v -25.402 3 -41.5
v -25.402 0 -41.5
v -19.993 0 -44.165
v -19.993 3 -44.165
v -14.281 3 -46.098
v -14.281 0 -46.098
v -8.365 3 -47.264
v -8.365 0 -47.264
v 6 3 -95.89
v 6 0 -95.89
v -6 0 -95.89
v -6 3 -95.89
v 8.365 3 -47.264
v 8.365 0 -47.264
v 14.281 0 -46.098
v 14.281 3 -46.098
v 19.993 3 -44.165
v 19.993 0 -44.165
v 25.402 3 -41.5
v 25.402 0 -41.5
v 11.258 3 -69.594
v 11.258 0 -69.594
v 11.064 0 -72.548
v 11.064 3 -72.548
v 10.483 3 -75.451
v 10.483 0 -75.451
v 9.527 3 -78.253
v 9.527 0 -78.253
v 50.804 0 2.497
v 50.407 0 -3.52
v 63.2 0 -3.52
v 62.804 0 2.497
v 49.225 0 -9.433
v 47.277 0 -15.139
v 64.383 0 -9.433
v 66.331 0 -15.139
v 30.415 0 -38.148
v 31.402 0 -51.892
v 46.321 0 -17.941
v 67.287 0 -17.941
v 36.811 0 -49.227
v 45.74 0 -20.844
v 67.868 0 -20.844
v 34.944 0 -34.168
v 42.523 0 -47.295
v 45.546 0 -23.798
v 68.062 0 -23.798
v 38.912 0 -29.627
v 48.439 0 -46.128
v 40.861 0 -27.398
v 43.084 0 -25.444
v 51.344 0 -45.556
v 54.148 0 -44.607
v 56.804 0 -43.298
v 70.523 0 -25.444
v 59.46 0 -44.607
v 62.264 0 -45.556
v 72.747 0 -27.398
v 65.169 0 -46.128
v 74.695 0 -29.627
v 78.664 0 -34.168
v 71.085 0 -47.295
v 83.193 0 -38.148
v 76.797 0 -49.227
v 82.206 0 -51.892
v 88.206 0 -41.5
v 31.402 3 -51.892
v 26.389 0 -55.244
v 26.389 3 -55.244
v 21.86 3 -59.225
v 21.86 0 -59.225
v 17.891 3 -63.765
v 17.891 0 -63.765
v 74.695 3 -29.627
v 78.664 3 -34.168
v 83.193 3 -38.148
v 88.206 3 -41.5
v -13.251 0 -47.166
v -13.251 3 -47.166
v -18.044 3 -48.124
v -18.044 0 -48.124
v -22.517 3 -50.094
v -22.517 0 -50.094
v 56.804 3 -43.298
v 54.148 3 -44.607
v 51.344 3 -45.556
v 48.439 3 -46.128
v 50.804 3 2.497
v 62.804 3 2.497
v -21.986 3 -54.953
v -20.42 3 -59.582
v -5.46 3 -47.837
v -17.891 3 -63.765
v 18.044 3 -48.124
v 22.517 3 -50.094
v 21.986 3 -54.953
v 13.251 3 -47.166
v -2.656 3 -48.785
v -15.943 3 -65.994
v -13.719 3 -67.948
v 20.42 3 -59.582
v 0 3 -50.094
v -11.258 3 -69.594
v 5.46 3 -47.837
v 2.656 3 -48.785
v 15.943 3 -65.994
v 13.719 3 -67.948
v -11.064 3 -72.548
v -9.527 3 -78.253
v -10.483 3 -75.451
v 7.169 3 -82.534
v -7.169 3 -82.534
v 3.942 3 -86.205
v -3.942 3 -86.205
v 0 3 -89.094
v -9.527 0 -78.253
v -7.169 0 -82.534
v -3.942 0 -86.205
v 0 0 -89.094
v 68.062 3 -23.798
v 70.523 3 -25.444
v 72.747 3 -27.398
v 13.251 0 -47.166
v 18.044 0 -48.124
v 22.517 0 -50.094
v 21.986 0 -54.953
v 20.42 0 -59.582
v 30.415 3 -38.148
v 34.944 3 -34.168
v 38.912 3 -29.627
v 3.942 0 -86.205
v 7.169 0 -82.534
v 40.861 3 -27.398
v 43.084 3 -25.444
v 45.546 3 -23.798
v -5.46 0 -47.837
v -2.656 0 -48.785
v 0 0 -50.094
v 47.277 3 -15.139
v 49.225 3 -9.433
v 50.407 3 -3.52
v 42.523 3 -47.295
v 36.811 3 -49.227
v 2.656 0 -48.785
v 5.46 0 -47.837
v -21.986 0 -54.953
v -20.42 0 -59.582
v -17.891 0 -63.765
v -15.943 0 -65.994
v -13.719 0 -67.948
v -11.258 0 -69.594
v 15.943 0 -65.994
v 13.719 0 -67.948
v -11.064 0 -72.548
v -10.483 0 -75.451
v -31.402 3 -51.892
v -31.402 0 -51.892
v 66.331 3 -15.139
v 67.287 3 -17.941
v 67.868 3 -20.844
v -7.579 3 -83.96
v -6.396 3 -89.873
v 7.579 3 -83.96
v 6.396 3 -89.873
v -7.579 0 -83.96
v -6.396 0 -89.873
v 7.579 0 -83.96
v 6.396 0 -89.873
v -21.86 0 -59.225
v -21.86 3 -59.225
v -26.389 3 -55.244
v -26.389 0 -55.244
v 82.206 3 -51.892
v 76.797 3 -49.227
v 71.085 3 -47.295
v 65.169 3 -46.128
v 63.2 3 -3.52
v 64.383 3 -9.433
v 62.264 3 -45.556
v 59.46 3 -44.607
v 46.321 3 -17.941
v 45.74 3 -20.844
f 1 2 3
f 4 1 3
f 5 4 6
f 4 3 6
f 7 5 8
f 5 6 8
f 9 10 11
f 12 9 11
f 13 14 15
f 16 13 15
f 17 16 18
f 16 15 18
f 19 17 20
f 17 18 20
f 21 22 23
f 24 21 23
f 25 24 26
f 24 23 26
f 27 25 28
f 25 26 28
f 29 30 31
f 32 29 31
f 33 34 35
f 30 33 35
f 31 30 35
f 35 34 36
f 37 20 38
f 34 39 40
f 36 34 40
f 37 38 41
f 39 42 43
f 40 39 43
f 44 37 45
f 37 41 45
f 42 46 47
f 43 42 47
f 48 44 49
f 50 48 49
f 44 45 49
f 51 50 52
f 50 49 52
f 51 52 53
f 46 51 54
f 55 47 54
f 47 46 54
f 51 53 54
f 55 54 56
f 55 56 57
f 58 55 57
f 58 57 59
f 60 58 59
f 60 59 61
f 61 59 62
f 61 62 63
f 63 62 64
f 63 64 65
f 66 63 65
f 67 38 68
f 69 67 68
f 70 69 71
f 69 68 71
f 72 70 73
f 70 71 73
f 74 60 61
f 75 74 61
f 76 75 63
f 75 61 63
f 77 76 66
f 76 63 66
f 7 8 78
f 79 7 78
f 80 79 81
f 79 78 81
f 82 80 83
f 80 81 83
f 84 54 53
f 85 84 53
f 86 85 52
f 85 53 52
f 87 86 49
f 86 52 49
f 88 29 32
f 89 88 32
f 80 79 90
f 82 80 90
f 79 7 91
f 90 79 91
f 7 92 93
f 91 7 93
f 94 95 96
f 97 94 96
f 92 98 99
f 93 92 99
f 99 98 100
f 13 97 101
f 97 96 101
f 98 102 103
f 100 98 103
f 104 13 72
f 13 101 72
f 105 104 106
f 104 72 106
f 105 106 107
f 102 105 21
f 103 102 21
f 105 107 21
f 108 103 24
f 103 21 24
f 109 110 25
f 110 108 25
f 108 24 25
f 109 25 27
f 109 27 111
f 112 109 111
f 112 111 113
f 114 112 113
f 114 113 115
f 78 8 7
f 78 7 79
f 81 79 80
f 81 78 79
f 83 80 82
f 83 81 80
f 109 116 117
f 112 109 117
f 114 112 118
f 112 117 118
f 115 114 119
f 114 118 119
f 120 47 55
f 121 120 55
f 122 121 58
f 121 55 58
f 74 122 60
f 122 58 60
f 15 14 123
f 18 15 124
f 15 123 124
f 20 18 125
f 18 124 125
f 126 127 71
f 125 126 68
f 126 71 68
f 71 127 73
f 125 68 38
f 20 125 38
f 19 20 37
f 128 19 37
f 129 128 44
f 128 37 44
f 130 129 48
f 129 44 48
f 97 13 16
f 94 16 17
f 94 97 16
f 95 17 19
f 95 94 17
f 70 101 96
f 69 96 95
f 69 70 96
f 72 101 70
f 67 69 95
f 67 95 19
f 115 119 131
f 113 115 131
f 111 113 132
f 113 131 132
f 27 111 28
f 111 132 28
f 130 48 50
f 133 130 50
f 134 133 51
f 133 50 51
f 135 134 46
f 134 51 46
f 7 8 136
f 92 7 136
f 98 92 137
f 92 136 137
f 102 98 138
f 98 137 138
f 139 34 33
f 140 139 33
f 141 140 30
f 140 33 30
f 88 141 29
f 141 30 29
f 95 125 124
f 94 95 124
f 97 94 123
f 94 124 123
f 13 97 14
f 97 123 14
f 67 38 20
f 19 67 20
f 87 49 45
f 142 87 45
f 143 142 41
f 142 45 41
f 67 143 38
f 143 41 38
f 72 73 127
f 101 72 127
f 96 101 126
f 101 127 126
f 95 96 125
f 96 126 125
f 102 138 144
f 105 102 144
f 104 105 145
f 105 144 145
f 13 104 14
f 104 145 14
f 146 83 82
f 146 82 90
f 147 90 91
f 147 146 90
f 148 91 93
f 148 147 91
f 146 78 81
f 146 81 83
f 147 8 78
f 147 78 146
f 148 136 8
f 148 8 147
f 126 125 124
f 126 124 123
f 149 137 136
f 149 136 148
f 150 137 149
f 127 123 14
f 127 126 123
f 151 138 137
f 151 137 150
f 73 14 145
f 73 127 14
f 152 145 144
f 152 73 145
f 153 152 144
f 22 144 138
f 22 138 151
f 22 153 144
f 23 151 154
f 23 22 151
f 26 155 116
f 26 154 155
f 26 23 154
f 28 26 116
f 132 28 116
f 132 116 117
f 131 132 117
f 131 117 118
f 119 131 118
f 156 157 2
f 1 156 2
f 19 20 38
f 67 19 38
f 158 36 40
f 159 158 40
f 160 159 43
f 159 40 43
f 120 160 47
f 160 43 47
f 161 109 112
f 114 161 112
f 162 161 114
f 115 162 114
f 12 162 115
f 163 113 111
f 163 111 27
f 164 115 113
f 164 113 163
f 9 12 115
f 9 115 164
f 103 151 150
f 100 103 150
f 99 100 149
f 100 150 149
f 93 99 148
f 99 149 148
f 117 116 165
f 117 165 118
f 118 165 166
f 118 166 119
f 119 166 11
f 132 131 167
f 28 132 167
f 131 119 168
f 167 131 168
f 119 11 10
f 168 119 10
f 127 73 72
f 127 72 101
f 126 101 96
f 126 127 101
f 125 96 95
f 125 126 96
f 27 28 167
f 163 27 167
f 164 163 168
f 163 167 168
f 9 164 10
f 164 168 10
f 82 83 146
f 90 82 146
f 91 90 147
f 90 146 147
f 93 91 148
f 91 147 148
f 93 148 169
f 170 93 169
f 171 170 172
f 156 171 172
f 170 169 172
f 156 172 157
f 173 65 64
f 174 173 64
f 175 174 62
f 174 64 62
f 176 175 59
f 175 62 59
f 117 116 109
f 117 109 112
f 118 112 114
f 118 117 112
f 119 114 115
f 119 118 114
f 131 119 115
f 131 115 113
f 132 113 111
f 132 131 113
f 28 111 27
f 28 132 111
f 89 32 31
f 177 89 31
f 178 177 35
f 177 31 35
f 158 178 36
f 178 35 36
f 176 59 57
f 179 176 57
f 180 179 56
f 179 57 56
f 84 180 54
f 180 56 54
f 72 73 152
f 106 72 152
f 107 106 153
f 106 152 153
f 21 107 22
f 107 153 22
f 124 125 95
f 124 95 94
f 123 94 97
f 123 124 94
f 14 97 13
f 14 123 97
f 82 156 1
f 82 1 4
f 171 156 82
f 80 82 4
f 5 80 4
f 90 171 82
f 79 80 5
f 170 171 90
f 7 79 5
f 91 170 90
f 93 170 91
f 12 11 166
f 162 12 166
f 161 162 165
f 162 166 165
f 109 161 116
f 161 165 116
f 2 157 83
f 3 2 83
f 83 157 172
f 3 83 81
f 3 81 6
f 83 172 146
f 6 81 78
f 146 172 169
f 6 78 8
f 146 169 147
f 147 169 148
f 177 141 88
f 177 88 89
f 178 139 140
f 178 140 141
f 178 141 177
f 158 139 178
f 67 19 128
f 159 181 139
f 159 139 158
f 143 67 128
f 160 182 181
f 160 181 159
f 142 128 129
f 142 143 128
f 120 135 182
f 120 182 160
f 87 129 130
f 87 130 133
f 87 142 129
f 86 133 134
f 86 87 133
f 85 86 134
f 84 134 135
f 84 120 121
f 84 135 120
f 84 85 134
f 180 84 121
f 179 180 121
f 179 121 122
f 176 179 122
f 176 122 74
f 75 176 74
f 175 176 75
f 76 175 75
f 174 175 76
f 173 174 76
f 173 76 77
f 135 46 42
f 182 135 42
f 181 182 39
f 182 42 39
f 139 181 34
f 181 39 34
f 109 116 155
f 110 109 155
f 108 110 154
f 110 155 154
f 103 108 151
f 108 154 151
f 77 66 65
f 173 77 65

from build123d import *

# Parameters (mm, degrees)
BOSS_EXTRUDE1_DEPTH = 3
SPLIT1_DEPTH        = 3
SPLIT1_2_DEPTH      = 3
SPLIT1_3_DEPTH      = 3
SPLIT1_4_DEPTH      = 3
SPLIT1_5_DEPTH      = 3


# Read off the part's stored shape, not the designer's step: Split1
with BuildPart() as part:
    # Sketch3 → Boss-Extrude1 (new body)
    with BuildSketch(Plane(origin=(0, 0, 0), x_dir=(1, 0, 0), z_dir=(0, 1, 0))):
        with BuildLine():
            ThreePointArc((-11.258330249, 69.594010768), (-14.863463971, 67.007834664), (-17.891493772, 63.764945286))
            ThreePointArc((-17.891493772, 63.764945286), (-24.058982438, 57.159830807), (-31.401915905, 51.892309397))
            Line((-31.401915905, 51.892309397), (-25.401915905, 41.500004551))
            ThreePointArc((-25.401915905, 41.500004551), (-17.168641815, 45.225410767), (-8.364700549, 47.26405539))
            ThreePointArc((-8.364700549, 47.26405539), (-4.042261066, 48.264961433), (0, 50.094010768))
            ThreePointArc((0, 50.094010768), (4.042261066, 48.264961433), (8.364700549, 47.26405539))
            ThreePointArc((8.364700549, 47.26405539), (17.168641815, 45.225410767), (25.401915905, 41.500004551))
            Line((25.401915905, 41.500004551), (31.401915905, 51.892309397))
            ThreePointArc((31.401915905, 51.892309397), (24.058982438, 57.159830807), (17.891493772, 63.764945286))
            ThreePointArc((17.891493772, 63.764945286), (14.863463971, 67.007834664), (11.258330249, 69.594010768))
            ThreePointArc((11.258330249, 69.594010768), (8.241669751, 80.852341017), (0, 89.094010768))
            ThreePointArc((0, 89.094010768), (-8.241669751, 80.852341017), (-11.258330249, 69.594010768))
        make_face()
        with BuildLine():
            ThreePointArc((-6, 95.889718354), (-6.890340623, 86.896790728), (-9.526793223, 78.253031627))
            ThreePointArc((-9.526793223, 78.253031627), (-5.655493647, 84.457474738), (0, 89.094010768))
            ThreePointArc((0, 89.094010768), (5.655493647, 84.457474738), (9.526793223, 78.253031627))
            ThreePointArc((9.526793223, 78.253031627), (6.890340623, 86.896790728), (6, 95.889718354))
            Line((6, 95.889718354), (-6, 95.889718354))
        make_face()
    extrude(amount=BOSS_EXTRUDE1_DEPTH)

    # Mirror1: part across plane


with BuildPart() as part_1:
    add(part.part)
    add(part.part.mirror(Plane(origin=(1.08140783, 3, 0.624351102), x_dir=(-0.4999999999999996, 0, 0.8660254037844389), z_dir=(-0.8660254037844389, 0, -0.4999999999999996))))

    # Split1 outline → Split1 (cut)
    with BuildSketch(Plane(origin=(0, 0, 0), x_dir=(1, 0, 0), z_dir=(0, 1, 0))):
        with BuildLine():
            ThreePointArc((17.891493772, 63.764945286), (21.329049335, 57.310079951), (22.516660498, 50.094010768))
            ThreePointArc((22.516660498, 50.094010768), (15.673555688, 47.514477613), (8.364700549, 47.26405539))
            ThreePointArc((8.364700549, 47.26405539), (25.401915905, 41.500004551), (38.912338039, 29.627368662))
            ThreePointArc((38.912338039, 29.627368662), (41.94036784, 26.384479285), (45.545501561, 23.798303181))
            ThreePointArc((45.545501561, 23.798303181), (45.982628905, 19.383077742), (47.277038587, 15.139282322))
            ThreePointArc((47.277038587, 15.139282322), (49.913491188, 6.495523221), (50.803831811, -2.497404406))
            Line((50.803831811, -2.497404406), (62.803831811, -2.497404406))
            ThreePointArc((62.803831811, -2.497404406), (63.694172433, 6.495523221), (66.330625034, 15.139282322))
            ThreePointArc((66.330625034, 15.139282322), (67.625034716, 19.383077742), (68.06216206, 23.798303181))
            ThreePointArc((68.06216206, 23.798303181), (71.667295782, 26.384479285), (74.695325583, 29.627368662))
            ThreePointArc((74.695325583, 29.627368662), (80.862814248, 36.232483141), (88.205747716, 41.500004551))
            Line((88.205747716, 41.500004551), (82.205747716, 51.892309397))
            ThreePointArc((82.205747716, 51.892309397), (73.972473626, 48.166903181), (65.168532359, 46.128258558))
            ThreePointArc((65.168532359, 46.128258558), (60.846092876, 45.127352516), (56.803831811, 43.298303181))
            ThreePointArc((56.803831811, 43.298303181), (52.761570745, 45.127352516), (48.439131262, 46.128258558))
            ThreePointArc((48.439131262, 46.128258558), (31.401915905, 51.892309397), (17.891493772, 63.764945286))
        make_face()
        with BuildLine():
            ThreePointArc((0, 89.094010768), (5.655493647, 84.457474739), (9.526793223, 78.253031627))
            ThreePointArc((9.526793223, 78.253031627), (6.890340623, 86.896790728), (6, 95.889718354))
            Line((6, 95.889718354), (-6, 95.889718354))
            ThreePointArc((-6, 95.889718354), (-6.890340623, 86.896790728), (-9.526793223, 78.253031627))
            ThreePointArc((-9.526793223, 78.253031627), (-5.655493647, 84.457474739), (0, 89.094010768))
        make_face()
        with BuildLine():
            ThreePointArc((-25.401915905, 41.500004551), (-17.168641815, 45.225410767), (-8.364700549, 47.26405539))
            ThreePointArc((-8.364700549, 47.26405539), (-15.673555688, 47.514477613), (-22.516660498, 50.094010768))
            ThreePointArc((-22.516660498, 50.094010768), (-21.329049335, 57.310079951), (-17.891493772, 63.764945286))
            ThreePointArc((-17.891493772, 63.764945286), (-24.058982438, 57.159830807), (-31.401915905, 51.892309397))
            Line((-31.401915905, 51.892309397), (-25.401915905, 41.500004551))
        make_face()
    extrude(amount=SPLIT1_DEPTH, mode=Mode.SUBTRACT)


with BuildPart() as body_2:
    # Split1 2 outline → Split1 2 (new body)
    with BuildSketch(Plane(origin=(0, 0, 0), x_dir=(1, 0, 0), z_dir=(0, 1, 0))):
        with BuildLine():
            Line((31.401915905, 51.892309397), (25.401915905, 41.500004551))
            ThreePointArc((25.401915905, 41.500004551), (32.744849373, 36.232483141), (38.912338039, 29.627368662))
            ThreePointArc((38.912338039, 29.627368662), (41.94036784, 26.384479285), (45.545501561, 23.798303181))
            ThreePointArc((45.545501561, 23.798303181), (45.982628905, 19.383077742), (47.277038587, 15.139282322))
            ThreePointArc((47.277038587, 15.139282322), (49.913491188, 6.495523221), (50.803831811, -2.497404406))
            Line((50.803831811, -2.497404406), (62.803831811, -2.497404406))
            ThreePointArc((62.803831811, -2.497404406), (63.694172433, 6.495523221), (66.330625034, 15.139282322))
            ThreePointArc((66.330625034, 15.139282322), (67.625034716, 19.383077742), (68.06216206, 23.798303181))
            ThreePointArc((68.06216206, 23.798303181), (71.667295782, 26.384479285), (74.695325583, 29.627368662))
            ThreePointArc((74.695325583, 29.627368662), (80.862814248, 36.232483141), (88.205747716, 41.500004551))
            Line((88.205747716, 41.500004551), (82.205747716, 51.892309397))
            ThreePointArc((82.205747716, 51.892309397), (73.972473626, 48.166903181), (65.168532359, 46.128258558))
            ThreePointArc((65.168532359, 46.128258558), (60.846092876, 45.127352516), (56.803831811, 43.298303181))
            ThreePointArc((56.803831811, 43.298303181), (52.761570745, 45.127352516), (48.439131262, 46.128258558))
            ThreePointArc((48.439131262, 46.128258558), (39.635189996, 48.166903181), (31.401915905, 51.892309397))
        make_face()
    extrude(amount=SPLIT1_2_DEPTH)


with BuildPart() as body_3:
    # Split1 3 outline → Split1 3 (new body)
    with BuildSketch(Plane(origin=(0, 0, 0), x_dir=(1, 0, 0), z_dir=(0, 1, 0))):
        with BuildLine():
            ThreePointArc((17.891493772, 63.764945286), (21.329049335, 57.310079951), (22.516660498, 50.094010768))
            ThreePointArc((22.516660498, 50.094010768), (15.673555688, 47.514477613), (8.364700549, 47.26405539))
            ThreePointArc((8.364700549, 47.26405539), (17.168641815, 45.225410767), (25.401915905, 41.500004551))
            Line((25.401915905, 41.500004551), (31.401915905, 51.892309397))
            ThreePointArc((31.401915905, 51.892309397), (24.058982438, 57.159830807), (17.891493772, 63.764945286))
        make_face()
    extrude(amount=SPLIT1_3_DEPTH)


with BuildPart() as body_4:
    # Split1 4 outline → Split1 4 (new body)
    with BuildSketch(Plane(origin=(0, 0, 0), x_dir=(1, 0, 0), z_dir=(0, 1, 0))):
        with BuildLine():
            ThreePointArc((-9.526793223, 78.253031627), (-5.655493646, 84.457474739), (0, 89.094010768))
            ThreePointArc((0, 89.094010768), (5.655493646, 84.457474739), (9.526793223, 78.253031627))
            ThreePointArc((9.526793223, 78.253031627), (6.890340623, 86.896790728), (6, 95.889718354))
            Line((6, 95.889718354), (-6, 95.889718354))
            ThreePointArc((-6, 95.889718354), (-6.890340623, 86.896790728), (-9.526793223, 78.253031627))
        make_face()
    extrude(amount=SPLIT1_4_DEPTH)


with BuildPart() as body_5:
    # Split1 5 outline → Split1 5 (new body)
    with BuildSketch(Plane(origin=(0, 0, 0), x_dir=(1, 0, 0), z_dir=(0, 1, 0))):
        with BuildLine():
            ThreePointArc((-8.364700549, 47.26405539), (-15.673555688, 47.514477613), (-22.516660498, 50.094010768))
            ThreePointArc((-22.516660498, 50.094010768), (-21.329049335, 57.310079951), (-17.891493772, 63.764945286))
            ThreePointArc((-17.891493772, 63.764945286), (-24.058982438, 57.159830807), (-31.401915905, 51.892309397))
            Line((-31.401915905, 51.892309397), (-25.401915905, 41.500004551))
            ThreePointArc((-25.401915905, 41.500004551), (-17.168641815, 45.225410767), (-8.364700549, 47.26405539))
        make_face()
    extrude(amount=SPLIT1_5_DEPTH)


solid = Compound([part_1.part, body_2.part, body_3.part, body_4.part, body_5.part])
